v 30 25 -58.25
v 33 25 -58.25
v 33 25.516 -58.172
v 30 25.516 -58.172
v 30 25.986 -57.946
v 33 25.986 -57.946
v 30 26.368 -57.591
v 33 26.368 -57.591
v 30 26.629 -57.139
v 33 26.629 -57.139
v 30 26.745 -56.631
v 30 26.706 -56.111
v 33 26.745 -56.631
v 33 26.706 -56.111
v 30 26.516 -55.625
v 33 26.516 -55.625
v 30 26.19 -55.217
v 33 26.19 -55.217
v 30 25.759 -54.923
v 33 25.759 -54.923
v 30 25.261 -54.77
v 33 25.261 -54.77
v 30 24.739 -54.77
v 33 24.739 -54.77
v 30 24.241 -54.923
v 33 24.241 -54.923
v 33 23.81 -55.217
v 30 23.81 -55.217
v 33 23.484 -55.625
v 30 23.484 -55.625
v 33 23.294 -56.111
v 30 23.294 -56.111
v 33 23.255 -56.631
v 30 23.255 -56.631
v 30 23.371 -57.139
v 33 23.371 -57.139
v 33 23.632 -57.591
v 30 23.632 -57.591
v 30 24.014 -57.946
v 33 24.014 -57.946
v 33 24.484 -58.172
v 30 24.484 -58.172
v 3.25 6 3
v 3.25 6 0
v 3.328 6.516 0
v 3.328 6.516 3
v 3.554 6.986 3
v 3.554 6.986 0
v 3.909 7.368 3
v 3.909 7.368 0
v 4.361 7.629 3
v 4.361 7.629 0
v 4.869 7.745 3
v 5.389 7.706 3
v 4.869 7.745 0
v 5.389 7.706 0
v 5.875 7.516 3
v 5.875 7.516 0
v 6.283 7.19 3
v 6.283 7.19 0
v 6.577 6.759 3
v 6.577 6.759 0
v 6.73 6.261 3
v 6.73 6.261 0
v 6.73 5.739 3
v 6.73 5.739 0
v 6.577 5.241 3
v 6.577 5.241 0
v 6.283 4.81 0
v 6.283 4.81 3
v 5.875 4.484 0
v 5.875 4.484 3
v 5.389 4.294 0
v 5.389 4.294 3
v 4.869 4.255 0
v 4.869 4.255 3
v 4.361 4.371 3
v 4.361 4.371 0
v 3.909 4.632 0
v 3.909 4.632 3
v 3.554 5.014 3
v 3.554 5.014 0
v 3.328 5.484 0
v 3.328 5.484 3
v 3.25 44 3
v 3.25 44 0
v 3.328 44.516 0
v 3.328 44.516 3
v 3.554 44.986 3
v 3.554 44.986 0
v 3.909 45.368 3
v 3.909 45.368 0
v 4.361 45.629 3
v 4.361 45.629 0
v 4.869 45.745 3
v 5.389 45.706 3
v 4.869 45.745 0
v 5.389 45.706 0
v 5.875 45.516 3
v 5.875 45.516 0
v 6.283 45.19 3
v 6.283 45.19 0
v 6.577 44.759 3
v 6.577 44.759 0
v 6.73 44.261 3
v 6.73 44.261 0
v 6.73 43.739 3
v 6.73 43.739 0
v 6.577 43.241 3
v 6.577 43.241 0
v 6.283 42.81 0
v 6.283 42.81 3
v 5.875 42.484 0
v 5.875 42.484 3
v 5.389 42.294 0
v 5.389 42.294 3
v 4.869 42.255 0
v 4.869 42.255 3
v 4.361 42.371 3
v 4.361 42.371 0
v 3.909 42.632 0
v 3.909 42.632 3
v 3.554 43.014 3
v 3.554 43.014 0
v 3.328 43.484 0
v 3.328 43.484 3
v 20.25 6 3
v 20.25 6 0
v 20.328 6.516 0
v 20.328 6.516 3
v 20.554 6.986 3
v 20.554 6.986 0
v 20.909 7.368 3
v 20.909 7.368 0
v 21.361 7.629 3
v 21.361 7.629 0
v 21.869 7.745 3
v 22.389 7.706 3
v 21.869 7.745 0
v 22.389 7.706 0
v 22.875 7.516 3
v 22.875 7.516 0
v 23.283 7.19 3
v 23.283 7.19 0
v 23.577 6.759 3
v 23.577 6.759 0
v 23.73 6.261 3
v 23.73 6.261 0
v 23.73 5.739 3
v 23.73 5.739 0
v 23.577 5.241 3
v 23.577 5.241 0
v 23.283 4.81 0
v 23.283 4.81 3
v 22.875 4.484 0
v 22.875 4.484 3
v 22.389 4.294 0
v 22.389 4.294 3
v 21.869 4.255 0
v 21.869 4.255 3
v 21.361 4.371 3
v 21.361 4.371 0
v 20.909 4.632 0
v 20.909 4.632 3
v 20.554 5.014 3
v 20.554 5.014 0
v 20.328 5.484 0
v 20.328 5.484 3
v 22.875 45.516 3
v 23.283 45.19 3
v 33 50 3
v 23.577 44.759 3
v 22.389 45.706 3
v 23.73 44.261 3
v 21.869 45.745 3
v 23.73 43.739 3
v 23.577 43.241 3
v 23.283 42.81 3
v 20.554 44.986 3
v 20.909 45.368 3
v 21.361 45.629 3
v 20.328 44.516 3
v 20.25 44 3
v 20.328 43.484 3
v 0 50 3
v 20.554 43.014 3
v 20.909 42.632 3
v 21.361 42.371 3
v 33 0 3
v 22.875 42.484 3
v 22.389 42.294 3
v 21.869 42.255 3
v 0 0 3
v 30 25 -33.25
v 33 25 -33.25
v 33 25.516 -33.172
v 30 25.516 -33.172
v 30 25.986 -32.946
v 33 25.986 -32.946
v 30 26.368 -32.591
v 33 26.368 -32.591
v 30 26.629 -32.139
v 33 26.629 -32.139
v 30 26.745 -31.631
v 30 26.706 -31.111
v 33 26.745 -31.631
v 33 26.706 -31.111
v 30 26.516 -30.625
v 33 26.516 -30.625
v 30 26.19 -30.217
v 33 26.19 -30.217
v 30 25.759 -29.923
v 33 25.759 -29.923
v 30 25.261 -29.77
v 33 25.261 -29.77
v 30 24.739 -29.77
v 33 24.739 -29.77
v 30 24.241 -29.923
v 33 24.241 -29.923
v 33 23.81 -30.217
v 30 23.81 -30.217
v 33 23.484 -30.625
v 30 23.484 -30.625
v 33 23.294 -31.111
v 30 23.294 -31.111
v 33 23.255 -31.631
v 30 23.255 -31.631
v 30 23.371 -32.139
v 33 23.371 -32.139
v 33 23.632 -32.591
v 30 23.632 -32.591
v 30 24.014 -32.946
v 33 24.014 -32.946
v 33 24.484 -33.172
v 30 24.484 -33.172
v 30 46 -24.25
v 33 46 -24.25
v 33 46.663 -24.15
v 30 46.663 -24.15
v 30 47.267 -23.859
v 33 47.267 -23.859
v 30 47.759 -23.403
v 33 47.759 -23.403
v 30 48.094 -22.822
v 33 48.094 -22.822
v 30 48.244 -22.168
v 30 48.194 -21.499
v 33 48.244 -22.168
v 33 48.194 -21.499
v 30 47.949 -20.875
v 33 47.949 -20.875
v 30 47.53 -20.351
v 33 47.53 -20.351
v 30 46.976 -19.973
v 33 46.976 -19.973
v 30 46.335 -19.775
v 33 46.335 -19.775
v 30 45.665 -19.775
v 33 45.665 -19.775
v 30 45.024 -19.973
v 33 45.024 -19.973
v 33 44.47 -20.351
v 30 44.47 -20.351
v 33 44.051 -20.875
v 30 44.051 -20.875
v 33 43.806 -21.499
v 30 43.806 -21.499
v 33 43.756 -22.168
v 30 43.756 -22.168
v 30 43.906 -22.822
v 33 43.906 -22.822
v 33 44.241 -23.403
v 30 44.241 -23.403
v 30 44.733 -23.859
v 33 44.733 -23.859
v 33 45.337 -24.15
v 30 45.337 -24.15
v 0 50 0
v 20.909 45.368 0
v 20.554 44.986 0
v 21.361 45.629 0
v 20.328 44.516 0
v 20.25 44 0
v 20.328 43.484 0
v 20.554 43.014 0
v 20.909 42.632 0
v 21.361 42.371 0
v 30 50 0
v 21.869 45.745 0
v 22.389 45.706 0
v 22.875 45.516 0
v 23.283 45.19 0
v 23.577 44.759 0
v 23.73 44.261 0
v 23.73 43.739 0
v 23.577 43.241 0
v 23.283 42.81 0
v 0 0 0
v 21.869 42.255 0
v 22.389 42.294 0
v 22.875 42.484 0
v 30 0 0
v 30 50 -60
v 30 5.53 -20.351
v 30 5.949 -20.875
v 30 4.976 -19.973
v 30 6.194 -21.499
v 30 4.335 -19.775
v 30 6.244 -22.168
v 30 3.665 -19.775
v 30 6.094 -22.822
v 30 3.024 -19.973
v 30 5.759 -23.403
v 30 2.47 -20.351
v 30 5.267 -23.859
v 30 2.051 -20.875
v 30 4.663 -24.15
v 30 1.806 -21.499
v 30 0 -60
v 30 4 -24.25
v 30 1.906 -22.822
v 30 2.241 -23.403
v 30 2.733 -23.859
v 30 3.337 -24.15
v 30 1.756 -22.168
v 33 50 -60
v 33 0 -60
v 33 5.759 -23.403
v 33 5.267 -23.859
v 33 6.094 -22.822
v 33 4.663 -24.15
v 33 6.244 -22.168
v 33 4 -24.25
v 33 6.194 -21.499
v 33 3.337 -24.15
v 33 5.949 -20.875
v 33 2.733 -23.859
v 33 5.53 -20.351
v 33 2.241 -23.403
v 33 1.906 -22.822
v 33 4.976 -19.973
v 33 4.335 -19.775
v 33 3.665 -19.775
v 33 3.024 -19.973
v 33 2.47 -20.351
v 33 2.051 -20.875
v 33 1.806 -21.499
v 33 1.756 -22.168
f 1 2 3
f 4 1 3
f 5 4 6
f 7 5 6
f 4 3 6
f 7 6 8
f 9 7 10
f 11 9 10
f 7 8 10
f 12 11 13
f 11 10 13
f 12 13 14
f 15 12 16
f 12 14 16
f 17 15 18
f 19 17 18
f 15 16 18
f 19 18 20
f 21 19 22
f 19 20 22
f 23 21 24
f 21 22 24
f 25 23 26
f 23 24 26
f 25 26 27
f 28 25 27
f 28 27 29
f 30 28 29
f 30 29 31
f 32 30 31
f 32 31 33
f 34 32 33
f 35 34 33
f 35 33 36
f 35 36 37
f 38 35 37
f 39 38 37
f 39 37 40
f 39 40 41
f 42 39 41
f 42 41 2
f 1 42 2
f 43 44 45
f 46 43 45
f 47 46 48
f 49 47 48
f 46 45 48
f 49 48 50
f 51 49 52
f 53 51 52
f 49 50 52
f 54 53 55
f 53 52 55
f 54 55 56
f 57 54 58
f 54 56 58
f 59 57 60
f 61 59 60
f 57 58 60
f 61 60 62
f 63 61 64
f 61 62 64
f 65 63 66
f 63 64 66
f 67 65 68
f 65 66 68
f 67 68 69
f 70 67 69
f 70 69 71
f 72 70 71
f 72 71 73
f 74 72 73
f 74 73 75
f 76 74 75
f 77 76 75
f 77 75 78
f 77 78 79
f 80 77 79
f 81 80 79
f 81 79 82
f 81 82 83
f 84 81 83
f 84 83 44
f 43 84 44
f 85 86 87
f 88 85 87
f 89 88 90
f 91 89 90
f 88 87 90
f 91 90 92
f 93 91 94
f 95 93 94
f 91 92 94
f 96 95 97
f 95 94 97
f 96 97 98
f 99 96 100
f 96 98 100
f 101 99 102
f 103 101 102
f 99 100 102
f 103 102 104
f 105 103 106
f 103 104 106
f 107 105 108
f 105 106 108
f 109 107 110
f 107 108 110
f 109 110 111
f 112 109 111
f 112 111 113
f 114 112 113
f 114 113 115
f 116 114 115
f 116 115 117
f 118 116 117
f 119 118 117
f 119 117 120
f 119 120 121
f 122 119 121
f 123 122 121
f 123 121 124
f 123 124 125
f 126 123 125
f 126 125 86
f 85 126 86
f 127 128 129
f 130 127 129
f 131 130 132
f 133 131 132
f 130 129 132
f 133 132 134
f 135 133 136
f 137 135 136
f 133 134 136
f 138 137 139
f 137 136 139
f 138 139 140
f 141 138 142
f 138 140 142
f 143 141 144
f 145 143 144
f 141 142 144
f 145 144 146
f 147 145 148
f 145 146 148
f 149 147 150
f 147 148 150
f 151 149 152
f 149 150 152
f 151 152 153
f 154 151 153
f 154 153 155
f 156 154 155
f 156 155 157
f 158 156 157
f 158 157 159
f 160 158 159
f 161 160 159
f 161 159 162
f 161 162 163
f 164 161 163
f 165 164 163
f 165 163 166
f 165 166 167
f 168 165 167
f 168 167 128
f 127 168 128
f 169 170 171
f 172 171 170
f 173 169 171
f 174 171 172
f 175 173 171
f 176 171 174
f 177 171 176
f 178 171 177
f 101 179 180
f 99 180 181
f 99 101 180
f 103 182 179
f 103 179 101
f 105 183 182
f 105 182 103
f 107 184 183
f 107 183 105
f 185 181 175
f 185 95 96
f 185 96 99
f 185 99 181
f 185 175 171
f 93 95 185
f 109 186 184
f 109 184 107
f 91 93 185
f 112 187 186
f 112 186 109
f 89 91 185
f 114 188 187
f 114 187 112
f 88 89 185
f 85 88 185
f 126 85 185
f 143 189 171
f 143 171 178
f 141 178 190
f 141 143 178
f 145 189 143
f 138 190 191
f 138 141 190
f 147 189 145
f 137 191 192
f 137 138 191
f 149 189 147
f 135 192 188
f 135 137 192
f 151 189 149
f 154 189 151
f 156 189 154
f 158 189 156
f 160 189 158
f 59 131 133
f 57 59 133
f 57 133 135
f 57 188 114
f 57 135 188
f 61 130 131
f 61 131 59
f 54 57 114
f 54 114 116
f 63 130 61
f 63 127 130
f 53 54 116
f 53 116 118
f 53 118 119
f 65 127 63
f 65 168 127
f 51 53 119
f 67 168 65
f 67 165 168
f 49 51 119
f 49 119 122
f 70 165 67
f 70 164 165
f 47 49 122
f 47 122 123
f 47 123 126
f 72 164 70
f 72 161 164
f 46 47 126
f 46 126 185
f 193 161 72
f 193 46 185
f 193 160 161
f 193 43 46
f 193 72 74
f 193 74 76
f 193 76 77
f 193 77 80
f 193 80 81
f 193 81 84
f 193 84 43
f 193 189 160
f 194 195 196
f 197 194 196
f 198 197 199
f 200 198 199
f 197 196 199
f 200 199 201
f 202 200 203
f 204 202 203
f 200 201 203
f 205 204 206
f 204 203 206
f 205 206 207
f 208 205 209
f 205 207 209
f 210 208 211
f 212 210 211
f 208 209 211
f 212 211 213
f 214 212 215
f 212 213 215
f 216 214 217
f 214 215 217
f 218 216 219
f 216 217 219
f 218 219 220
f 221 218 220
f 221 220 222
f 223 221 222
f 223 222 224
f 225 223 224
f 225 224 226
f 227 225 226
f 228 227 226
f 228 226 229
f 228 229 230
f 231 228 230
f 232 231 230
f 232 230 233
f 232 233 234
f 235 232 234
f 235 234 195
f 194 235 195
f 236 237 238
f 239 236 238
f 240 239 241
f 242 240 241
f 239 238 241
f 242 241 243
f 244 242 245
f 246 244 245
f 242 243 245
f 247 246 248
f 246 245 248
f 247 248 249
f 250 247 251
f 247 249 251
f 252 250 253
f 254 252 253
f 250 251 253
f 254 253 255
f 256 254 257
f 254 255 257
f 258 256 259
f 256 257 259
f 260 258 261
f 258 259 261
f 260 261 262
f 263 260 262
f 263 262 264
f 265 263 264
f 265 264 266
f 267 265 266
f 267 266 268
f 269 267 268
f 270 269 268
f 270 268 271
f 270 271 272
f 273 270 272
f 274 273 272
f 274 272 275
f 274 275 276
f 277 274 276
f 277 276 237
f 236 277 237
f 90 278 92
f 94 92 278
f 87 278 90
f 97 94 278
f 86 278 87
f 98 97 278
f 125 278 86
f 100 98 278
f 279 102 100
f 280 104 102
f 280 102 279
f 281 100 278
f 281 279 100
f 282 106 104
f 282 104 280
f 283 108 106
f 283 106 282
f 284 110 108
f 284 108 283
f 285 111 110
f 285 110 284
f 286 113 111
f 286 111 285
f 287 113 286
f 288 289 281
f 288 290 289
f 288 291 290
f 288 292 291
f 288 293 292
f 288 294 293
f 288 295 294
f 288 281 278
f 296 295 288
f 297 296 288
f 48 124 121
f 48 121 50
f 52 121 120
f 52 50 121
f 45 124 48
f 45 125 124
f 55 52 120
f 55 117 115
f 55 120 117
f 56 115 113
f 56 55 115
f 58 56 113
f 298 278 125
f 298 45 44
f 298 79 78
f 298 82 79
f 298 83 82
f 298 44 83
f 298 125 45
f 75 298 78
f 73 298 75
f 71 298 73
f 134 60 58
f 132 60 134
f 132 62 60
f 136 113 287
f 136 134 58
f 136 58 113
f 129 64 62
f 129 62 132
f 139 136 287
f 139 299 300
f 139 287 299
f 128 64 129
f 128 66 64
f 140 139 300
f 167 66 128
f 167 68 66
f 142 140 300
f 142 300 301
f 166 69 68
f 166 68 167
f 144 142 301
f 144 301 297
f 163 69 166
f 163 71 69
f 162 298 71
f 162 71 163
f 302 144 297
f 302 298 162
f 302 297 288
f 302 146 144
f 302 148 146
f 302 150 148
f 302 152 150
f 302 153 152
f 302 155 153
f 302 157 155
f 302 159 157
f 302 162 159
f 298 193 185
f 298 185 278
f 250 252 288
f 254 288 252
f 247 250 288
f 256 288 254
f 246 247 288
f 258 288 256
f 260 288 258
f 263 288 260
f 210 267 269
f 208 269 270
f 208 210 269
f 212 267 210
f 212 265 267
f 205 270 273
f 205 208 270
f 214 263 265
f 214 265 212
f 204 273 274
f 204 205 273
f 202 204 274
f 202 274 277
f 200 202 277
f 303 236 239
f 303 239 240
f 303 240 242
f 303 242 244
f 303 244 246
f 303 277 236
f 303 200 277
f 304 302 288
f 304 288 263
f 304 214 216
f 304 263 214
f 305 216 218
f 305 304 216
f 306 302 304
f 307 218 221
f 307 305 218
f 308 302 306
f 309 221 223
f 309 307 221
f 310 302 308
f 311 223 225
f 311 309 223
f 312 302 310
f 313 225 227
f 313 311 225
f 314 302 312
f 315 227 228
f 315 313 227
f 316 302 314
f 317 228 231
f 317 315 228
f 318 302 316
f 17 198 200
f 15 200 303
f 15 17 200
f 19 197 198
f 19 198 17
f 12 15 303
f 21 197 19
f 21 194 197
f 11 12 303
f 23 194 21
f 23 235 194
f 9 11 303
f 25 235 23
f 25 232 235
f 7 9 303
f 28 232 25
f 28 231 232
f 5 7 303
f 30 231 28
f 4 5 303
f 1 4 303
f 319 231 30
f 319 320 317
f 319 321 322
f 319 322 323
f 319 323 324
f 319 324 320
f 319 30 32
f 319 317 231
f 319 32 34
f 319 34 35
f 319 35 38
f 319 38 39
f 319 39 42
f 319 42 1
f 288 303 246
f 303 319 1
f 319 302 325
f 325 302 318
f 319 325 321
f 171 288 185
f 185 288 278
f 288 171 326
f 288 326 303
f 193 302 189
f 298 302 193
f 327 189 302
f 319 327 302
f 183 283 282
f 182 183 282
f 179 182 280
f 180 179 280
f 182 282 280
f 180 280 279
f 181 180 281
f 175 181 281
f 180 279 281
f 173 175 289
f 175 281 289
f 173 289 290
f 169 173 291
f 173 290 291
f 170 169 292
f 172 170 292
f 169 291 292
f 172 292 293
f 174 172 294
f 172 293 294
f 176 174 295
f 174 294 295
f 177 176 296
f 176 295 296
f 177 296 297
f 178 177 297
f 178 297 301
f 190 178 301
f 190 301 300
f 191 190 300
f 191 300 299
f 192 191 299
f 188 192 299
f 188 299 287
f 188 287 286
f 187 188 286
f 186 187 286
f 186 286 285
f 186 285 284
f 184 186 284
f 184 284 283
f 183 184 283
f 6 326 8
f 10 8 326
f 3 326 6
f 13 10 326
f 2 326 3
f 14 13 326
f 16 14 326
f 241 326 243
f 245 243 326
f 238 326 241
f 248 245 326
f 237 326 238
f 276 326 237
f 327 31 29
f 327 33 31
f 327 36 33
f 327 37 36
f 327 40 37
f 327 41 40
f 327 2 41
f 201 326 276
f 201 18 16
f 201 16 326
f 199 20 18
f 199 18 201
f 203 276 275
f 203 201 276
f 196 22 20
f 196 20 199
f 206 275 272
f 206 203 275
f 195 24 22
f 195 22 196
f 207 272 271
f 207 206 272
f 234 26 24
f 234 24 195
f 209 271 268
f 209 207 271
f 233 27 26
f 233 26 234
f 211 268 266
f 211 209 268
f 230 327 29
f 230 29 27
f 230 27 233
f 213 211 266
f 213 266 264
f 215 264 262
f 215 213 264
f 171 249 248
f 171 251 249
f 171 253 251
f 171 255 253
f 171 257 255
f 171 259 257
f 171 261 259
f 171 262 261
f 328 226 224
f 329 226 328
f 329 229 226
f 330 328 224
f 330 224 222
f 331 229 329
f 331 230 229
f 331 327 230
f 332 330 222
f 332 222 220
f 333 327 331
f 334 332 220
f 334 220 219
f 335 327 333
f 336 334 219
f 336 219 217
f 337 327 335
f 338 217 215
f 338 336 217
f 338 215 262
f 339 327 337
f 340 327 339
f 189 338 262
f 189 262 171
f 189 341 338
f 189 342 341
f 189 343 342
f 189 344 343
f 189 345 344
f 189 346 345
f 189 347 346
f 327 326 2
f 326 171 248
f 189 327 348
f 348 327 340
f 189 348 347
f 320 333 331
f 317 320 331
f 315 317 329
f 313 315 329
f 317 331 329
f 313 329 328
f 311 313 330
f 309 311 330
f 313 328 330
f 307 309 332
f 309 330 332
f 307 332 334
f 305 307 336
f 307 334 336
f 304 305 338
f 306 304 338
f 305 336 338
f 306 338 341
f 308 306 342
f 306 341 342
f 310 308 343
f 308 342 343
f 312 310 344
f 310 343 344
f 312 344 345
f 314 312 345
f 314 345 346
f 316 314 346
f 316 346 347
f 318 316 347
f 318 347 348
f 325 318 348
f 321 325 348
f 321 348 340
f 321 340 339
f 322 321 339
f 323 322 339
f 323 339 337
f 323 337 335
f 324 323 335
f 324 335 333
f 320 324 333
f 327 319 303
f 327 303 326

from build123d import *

# Parameters (mm, degrees)
EXTRUDE_1_DEPTH     = 50
SKETCH_2_R          = 1.75
CUT_EXTRUDE_1_DEPTH = 85.787970845
CUT_EXTRUDE_3_REACH = 86.788
SKETCH_4_R          = 1.75
SKETCH_4_R_2        = 2.25


with BuildPart() as part:
    # 草图1 → 凸台-拉伸1 (new body)
    with BuildSketch(Plane(origin=(0, 0, 0), x_dir=(1, 0, 0), z_dir=(0, 1, 0))):
        Polygon((0, 0), (30, 0), (30, 60), (33, 60), (33, -3), (0, -3), align=None)
    extrude(amount=EXTRUDE_1_DEPTH)

    # 草图2 → 切除-拉伸1 (cut, through all)
    with BuildSketch(Plane(origin=(0, 0, 0), x_dir=(-1, 0, 0), z_dir=(0, 0, -1))):
        with Locations((-22, 6)):
            Circle(SKETCH_2_R)
        with Locations((-22, 44)):
            Circle(SKETCH_2_R)
        with Locations((-5, 44)):
            Circle(SKETCH_2_R)
        with Locations((-5, 6)):
            Circle(SKETCH_2_R)
    extrude(amount=-CUT_EXTRUDE_1_DEPTH, mode=Mode.SUBTRACT)

    # 草图4 → 切除-拉伸3 (cut, up to next)
    with BuildSketch(Plane(origin=(33, 0, 0), x_dir=(0, 0, -1), z_dir=(1, 0, 0)), mode=Mode.PRIVATE) as cut_extrude_3_sk1:
        with Locations((56.5, 25)):
            Circle(SKETCH_4_R)
    cut_extrude_3_tool1 = extrude(cut_extrude_3_sk1.sketch, amount=-CUT_EXTRUDE_3_REACH, mode=Mode.PRIVATE) & part.part
    # 草图4 → 切除-拉伸3 (cut, up to next)
    with BuildSketch(Plane(origin=(33, 0, 0), x_dir=(0, 0, -1), z_dir=(1, 0, 0)), mode=Mode.PRIVATE) as cut_extrude_3_sk2:
        with Locations((31.5, 25)):
            Circle(SKETCH_4_R)
    cut_extrude_3_tool2 = extrude(cut_extrude_3_sk2.sketch, amount=-CUT_EXTRUDE_3_REACH, mode=Mode.PRIVATE) & part.part
    # 草图4 → 切除-拉伸3 (cut, up to next)
    with BuildSketch(Plane(origin=(33, 0, 0), x_dir=(0, 0, -1), z_dir=(1, 0, 0)), mode=Mode.PRIVATE) as cut_extrude_3_sk3:
        with Locations((22, 46)):
            Circle(SKETCH_4_R_2)
    cut_extrude_3_tool3 = extrude(cut_extrude_3_sk3.sketch, amount=-CUT_EXTRUDE_3_REACH, mode=Mode.PRIVATE) & part.part
    # 草图4 → 切除-拉伸3 (cut, up to next)
    with BuildSketch(Plane(origin=(33, 0, 0), x_dir=(0, 0, -1), z_dir=(1, 0, 0)), mode=Mode.PRIVATE) as cut_extrude_3_sk4:
        with Locations((22, 4)):
            Circle(SKETCH_4_R_2)
    cut_extrude_3_tool4 = extrude(cut_extrude_3_sk4.sketch, amount=-CUT_EXTRUDE_3_REACH, mode=Mode.PRIVATE) & part.part
    add(cut_extrude_3_tool1.solids().sort_by_distance((33, 25, -56.5))[0], mode=Mode.SUBTRACT)
    add(cut_extrude_3_tool2.solids().sort_by_distance((33, 25, -31.5))[0], mode=Mode.SUBTRACT)
    add(cut_extrude_3_tool3.solids().sort_by_distance((33, 46, -22))[0], mode=Mode.SUBTRACT)
    add(cut_extrude_3_tool4.solids().sort_by_distance((33, 4, -22))[0], mode=Mode.SUBTRACT)


solid = part.part
